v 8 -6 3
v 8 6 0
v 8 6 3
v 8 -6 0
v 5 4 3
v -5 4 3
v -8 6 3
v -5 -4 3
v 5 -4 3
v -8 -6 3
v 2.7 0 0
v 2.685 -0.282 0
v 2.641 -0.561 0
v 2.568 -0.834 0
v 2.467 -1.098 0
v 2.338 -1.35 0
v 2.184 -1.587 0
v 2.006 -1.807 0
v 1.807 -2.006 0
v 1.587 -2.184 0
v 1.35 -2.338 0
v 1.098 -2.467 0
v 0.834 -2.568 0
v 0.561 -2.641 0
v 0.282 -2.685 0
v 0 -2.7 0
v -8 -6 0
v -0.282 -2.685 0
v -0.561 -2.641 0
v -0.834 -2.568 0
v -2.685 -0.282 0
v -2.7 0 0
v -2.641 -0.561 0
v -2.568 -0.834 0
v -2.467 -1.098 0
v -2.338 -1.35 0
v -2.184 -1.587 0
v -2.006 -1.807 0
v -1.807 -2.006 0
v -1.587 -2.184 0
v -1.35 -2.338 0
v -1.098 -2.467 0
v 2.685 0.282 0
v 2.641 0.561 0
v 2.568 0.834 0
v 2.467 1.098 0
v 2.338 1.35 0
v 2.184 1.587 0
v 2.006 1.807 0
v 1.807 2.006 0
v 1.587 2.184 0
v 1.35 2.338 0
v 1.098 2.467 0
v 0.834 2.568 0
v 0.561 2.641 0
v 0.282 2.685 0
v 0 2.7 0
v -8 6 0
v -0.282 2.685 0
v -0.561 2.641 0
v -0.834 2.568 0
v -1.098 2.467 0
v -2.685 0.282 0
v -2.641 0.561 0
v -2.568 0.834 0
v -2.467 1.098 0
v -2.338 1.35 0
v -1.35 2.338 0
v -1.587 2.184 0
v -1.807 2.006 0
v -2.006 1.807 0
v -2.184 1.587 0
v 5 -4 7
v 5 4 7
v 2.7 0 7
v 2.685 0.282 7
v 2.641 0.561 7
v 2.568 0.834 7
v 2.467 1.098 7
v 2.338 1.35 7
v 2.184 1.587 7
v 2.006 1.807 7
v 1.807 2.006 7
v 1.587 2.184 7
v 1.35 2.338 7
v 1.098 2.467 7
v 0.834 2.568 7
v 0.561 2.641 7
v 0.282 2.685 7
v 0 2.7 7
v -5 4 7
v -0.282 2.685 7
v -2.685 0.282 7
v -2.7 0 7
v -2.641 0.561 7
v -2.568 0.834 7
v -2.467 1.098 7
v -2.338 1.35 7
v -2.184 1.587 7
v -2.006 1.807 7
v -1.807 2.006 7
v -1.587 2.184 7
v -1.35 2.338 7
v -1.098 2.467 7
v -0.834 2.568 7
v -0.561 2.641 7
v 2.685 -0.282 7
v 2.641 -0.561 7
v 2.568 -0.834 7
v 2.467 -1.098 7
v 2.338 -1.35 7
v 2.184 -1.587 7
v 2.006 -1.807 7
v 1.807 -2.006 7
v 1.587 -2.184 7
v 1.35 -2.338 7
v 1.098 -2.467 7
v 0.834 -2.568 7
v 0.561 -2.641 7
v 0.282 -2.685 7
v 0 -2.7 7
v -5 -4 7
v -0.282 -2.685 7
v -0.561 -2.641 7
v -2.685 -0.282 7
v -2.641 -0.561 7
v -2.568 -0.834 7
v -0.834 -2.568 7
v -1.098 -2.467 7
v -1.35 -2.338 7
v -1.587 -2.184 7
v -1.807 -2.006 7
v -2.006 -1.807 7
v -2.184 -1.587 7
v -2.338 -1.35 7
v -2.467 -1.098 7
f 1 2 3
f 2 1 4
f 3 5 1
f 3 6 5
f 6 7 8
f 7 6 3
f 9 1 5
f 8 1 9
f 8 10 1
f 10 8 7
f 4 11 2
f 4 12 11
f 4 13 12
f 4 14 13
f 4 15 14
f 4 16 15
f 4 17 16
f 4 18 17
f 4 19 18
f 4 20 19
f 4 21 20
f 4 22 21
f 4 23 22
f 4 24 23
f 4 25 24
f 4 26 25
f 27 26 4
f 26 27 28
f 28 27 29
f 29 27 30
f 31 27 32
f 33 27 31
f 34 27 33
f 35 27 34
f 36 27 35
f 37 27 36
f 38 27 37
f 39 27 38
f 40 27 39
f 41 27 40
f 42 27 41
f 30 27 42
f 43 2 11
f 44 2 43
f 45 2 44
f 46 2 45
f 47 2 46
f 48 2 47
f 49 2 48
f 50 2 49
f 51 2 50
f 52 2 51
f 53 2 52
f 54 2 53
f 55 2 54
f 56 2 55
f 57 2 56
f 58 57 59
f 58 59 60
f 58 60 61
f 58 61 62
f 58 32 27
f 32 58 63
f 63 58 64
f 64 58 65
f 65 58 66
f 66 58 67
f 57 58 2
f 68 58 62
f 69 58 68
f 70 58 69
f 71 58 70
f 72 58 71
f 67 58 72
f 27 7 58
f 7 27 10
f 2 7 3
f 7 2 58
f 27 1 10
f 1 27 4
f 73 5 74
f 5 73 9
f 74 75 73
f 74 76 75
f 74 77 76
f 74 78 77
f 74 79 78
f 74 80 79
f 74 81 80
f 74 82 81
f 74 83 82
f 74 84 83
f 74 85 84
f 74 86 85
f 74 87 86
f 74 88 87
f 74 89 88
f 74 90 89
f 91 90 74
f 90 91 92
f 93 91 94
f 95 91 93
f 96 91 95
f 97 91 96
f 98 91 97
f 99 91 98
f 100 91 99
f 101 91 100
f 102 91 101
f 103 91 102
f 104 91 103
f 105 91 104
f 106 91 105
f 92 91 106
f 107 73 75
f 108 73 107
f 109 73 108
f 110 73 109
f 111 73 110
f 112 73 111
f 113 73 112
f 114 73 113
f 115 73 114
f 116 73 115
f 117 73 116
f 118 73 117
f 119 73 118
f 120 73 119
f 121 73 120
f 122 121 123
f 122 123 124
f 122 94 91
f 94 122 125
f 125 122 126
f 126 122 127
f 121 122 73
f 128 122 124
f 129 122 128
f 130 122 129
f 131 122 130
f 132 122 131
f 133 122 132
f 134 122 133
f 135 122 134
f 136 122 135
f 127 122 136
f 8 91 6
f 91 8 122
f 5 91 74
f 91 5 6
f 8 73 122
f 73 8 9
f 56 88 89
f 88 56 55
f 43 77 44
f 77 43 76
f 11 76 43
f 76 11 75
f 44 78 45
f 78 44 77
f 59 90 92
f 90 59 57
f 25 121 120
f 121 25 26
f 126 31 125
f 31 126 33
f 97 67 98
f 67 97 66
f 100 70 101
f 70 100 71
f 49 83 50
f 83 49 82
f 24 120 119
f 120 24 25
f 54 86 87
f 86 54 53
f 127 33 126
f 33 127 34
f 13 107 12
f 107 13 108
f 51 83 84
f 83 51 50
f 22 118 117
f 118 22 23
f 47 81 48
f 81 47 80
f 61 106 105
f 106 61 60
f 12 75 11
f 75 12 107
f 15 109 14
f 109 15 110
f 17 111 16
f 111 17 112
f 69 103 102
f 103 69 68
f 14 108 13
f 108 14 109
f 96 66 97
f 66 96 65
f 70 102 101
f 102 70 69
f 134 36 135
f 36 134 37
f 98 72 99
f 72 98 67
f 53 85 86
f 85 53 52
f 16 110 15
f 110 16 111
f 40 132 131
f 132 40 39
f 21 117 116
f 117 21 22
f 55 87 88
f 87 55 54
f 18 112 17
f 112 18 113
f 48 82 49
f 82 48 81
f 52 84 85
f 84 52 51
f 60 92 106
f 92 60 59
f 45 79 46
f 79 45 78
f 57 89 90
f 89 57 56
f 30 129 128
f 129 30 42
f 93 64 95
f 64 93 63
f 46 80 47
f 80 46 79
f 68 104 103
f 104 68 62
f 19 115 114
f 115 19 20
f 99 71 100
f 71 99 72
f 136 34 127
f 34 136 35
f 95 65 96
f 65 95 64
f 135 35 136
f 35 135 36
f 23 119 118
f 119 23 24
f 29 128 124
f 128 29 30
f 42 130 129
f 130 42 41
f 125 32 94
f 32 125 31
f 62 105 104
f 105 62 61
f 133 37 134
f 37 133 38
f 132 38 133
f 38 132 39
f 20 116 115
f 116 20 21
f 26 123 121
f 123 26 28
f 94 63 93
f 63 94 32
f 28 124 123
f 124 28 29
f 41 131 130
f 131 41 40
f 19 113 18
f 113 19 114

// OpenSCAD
// T-slot nut for aluminium extrusion.
$fn = 60;
eps = 0.02;
slot_w = 8;
thread_d = 5.4;
length = 16;
body_w = slot_w + 4;
body_h = 7;
difference() {
    union() {
        translate([-length / 2, -body_w / 2, 0]) cube([length, body_w, 3]);
        translate([-length / 2 + 3, -slot_w / 2, 3]) cube([length - 6, slot_w, body_h - 3]);
    }
    translate([0, 0, -eps]) cylinder(d = thread_d, h = body_h + 2 * eps);
}
